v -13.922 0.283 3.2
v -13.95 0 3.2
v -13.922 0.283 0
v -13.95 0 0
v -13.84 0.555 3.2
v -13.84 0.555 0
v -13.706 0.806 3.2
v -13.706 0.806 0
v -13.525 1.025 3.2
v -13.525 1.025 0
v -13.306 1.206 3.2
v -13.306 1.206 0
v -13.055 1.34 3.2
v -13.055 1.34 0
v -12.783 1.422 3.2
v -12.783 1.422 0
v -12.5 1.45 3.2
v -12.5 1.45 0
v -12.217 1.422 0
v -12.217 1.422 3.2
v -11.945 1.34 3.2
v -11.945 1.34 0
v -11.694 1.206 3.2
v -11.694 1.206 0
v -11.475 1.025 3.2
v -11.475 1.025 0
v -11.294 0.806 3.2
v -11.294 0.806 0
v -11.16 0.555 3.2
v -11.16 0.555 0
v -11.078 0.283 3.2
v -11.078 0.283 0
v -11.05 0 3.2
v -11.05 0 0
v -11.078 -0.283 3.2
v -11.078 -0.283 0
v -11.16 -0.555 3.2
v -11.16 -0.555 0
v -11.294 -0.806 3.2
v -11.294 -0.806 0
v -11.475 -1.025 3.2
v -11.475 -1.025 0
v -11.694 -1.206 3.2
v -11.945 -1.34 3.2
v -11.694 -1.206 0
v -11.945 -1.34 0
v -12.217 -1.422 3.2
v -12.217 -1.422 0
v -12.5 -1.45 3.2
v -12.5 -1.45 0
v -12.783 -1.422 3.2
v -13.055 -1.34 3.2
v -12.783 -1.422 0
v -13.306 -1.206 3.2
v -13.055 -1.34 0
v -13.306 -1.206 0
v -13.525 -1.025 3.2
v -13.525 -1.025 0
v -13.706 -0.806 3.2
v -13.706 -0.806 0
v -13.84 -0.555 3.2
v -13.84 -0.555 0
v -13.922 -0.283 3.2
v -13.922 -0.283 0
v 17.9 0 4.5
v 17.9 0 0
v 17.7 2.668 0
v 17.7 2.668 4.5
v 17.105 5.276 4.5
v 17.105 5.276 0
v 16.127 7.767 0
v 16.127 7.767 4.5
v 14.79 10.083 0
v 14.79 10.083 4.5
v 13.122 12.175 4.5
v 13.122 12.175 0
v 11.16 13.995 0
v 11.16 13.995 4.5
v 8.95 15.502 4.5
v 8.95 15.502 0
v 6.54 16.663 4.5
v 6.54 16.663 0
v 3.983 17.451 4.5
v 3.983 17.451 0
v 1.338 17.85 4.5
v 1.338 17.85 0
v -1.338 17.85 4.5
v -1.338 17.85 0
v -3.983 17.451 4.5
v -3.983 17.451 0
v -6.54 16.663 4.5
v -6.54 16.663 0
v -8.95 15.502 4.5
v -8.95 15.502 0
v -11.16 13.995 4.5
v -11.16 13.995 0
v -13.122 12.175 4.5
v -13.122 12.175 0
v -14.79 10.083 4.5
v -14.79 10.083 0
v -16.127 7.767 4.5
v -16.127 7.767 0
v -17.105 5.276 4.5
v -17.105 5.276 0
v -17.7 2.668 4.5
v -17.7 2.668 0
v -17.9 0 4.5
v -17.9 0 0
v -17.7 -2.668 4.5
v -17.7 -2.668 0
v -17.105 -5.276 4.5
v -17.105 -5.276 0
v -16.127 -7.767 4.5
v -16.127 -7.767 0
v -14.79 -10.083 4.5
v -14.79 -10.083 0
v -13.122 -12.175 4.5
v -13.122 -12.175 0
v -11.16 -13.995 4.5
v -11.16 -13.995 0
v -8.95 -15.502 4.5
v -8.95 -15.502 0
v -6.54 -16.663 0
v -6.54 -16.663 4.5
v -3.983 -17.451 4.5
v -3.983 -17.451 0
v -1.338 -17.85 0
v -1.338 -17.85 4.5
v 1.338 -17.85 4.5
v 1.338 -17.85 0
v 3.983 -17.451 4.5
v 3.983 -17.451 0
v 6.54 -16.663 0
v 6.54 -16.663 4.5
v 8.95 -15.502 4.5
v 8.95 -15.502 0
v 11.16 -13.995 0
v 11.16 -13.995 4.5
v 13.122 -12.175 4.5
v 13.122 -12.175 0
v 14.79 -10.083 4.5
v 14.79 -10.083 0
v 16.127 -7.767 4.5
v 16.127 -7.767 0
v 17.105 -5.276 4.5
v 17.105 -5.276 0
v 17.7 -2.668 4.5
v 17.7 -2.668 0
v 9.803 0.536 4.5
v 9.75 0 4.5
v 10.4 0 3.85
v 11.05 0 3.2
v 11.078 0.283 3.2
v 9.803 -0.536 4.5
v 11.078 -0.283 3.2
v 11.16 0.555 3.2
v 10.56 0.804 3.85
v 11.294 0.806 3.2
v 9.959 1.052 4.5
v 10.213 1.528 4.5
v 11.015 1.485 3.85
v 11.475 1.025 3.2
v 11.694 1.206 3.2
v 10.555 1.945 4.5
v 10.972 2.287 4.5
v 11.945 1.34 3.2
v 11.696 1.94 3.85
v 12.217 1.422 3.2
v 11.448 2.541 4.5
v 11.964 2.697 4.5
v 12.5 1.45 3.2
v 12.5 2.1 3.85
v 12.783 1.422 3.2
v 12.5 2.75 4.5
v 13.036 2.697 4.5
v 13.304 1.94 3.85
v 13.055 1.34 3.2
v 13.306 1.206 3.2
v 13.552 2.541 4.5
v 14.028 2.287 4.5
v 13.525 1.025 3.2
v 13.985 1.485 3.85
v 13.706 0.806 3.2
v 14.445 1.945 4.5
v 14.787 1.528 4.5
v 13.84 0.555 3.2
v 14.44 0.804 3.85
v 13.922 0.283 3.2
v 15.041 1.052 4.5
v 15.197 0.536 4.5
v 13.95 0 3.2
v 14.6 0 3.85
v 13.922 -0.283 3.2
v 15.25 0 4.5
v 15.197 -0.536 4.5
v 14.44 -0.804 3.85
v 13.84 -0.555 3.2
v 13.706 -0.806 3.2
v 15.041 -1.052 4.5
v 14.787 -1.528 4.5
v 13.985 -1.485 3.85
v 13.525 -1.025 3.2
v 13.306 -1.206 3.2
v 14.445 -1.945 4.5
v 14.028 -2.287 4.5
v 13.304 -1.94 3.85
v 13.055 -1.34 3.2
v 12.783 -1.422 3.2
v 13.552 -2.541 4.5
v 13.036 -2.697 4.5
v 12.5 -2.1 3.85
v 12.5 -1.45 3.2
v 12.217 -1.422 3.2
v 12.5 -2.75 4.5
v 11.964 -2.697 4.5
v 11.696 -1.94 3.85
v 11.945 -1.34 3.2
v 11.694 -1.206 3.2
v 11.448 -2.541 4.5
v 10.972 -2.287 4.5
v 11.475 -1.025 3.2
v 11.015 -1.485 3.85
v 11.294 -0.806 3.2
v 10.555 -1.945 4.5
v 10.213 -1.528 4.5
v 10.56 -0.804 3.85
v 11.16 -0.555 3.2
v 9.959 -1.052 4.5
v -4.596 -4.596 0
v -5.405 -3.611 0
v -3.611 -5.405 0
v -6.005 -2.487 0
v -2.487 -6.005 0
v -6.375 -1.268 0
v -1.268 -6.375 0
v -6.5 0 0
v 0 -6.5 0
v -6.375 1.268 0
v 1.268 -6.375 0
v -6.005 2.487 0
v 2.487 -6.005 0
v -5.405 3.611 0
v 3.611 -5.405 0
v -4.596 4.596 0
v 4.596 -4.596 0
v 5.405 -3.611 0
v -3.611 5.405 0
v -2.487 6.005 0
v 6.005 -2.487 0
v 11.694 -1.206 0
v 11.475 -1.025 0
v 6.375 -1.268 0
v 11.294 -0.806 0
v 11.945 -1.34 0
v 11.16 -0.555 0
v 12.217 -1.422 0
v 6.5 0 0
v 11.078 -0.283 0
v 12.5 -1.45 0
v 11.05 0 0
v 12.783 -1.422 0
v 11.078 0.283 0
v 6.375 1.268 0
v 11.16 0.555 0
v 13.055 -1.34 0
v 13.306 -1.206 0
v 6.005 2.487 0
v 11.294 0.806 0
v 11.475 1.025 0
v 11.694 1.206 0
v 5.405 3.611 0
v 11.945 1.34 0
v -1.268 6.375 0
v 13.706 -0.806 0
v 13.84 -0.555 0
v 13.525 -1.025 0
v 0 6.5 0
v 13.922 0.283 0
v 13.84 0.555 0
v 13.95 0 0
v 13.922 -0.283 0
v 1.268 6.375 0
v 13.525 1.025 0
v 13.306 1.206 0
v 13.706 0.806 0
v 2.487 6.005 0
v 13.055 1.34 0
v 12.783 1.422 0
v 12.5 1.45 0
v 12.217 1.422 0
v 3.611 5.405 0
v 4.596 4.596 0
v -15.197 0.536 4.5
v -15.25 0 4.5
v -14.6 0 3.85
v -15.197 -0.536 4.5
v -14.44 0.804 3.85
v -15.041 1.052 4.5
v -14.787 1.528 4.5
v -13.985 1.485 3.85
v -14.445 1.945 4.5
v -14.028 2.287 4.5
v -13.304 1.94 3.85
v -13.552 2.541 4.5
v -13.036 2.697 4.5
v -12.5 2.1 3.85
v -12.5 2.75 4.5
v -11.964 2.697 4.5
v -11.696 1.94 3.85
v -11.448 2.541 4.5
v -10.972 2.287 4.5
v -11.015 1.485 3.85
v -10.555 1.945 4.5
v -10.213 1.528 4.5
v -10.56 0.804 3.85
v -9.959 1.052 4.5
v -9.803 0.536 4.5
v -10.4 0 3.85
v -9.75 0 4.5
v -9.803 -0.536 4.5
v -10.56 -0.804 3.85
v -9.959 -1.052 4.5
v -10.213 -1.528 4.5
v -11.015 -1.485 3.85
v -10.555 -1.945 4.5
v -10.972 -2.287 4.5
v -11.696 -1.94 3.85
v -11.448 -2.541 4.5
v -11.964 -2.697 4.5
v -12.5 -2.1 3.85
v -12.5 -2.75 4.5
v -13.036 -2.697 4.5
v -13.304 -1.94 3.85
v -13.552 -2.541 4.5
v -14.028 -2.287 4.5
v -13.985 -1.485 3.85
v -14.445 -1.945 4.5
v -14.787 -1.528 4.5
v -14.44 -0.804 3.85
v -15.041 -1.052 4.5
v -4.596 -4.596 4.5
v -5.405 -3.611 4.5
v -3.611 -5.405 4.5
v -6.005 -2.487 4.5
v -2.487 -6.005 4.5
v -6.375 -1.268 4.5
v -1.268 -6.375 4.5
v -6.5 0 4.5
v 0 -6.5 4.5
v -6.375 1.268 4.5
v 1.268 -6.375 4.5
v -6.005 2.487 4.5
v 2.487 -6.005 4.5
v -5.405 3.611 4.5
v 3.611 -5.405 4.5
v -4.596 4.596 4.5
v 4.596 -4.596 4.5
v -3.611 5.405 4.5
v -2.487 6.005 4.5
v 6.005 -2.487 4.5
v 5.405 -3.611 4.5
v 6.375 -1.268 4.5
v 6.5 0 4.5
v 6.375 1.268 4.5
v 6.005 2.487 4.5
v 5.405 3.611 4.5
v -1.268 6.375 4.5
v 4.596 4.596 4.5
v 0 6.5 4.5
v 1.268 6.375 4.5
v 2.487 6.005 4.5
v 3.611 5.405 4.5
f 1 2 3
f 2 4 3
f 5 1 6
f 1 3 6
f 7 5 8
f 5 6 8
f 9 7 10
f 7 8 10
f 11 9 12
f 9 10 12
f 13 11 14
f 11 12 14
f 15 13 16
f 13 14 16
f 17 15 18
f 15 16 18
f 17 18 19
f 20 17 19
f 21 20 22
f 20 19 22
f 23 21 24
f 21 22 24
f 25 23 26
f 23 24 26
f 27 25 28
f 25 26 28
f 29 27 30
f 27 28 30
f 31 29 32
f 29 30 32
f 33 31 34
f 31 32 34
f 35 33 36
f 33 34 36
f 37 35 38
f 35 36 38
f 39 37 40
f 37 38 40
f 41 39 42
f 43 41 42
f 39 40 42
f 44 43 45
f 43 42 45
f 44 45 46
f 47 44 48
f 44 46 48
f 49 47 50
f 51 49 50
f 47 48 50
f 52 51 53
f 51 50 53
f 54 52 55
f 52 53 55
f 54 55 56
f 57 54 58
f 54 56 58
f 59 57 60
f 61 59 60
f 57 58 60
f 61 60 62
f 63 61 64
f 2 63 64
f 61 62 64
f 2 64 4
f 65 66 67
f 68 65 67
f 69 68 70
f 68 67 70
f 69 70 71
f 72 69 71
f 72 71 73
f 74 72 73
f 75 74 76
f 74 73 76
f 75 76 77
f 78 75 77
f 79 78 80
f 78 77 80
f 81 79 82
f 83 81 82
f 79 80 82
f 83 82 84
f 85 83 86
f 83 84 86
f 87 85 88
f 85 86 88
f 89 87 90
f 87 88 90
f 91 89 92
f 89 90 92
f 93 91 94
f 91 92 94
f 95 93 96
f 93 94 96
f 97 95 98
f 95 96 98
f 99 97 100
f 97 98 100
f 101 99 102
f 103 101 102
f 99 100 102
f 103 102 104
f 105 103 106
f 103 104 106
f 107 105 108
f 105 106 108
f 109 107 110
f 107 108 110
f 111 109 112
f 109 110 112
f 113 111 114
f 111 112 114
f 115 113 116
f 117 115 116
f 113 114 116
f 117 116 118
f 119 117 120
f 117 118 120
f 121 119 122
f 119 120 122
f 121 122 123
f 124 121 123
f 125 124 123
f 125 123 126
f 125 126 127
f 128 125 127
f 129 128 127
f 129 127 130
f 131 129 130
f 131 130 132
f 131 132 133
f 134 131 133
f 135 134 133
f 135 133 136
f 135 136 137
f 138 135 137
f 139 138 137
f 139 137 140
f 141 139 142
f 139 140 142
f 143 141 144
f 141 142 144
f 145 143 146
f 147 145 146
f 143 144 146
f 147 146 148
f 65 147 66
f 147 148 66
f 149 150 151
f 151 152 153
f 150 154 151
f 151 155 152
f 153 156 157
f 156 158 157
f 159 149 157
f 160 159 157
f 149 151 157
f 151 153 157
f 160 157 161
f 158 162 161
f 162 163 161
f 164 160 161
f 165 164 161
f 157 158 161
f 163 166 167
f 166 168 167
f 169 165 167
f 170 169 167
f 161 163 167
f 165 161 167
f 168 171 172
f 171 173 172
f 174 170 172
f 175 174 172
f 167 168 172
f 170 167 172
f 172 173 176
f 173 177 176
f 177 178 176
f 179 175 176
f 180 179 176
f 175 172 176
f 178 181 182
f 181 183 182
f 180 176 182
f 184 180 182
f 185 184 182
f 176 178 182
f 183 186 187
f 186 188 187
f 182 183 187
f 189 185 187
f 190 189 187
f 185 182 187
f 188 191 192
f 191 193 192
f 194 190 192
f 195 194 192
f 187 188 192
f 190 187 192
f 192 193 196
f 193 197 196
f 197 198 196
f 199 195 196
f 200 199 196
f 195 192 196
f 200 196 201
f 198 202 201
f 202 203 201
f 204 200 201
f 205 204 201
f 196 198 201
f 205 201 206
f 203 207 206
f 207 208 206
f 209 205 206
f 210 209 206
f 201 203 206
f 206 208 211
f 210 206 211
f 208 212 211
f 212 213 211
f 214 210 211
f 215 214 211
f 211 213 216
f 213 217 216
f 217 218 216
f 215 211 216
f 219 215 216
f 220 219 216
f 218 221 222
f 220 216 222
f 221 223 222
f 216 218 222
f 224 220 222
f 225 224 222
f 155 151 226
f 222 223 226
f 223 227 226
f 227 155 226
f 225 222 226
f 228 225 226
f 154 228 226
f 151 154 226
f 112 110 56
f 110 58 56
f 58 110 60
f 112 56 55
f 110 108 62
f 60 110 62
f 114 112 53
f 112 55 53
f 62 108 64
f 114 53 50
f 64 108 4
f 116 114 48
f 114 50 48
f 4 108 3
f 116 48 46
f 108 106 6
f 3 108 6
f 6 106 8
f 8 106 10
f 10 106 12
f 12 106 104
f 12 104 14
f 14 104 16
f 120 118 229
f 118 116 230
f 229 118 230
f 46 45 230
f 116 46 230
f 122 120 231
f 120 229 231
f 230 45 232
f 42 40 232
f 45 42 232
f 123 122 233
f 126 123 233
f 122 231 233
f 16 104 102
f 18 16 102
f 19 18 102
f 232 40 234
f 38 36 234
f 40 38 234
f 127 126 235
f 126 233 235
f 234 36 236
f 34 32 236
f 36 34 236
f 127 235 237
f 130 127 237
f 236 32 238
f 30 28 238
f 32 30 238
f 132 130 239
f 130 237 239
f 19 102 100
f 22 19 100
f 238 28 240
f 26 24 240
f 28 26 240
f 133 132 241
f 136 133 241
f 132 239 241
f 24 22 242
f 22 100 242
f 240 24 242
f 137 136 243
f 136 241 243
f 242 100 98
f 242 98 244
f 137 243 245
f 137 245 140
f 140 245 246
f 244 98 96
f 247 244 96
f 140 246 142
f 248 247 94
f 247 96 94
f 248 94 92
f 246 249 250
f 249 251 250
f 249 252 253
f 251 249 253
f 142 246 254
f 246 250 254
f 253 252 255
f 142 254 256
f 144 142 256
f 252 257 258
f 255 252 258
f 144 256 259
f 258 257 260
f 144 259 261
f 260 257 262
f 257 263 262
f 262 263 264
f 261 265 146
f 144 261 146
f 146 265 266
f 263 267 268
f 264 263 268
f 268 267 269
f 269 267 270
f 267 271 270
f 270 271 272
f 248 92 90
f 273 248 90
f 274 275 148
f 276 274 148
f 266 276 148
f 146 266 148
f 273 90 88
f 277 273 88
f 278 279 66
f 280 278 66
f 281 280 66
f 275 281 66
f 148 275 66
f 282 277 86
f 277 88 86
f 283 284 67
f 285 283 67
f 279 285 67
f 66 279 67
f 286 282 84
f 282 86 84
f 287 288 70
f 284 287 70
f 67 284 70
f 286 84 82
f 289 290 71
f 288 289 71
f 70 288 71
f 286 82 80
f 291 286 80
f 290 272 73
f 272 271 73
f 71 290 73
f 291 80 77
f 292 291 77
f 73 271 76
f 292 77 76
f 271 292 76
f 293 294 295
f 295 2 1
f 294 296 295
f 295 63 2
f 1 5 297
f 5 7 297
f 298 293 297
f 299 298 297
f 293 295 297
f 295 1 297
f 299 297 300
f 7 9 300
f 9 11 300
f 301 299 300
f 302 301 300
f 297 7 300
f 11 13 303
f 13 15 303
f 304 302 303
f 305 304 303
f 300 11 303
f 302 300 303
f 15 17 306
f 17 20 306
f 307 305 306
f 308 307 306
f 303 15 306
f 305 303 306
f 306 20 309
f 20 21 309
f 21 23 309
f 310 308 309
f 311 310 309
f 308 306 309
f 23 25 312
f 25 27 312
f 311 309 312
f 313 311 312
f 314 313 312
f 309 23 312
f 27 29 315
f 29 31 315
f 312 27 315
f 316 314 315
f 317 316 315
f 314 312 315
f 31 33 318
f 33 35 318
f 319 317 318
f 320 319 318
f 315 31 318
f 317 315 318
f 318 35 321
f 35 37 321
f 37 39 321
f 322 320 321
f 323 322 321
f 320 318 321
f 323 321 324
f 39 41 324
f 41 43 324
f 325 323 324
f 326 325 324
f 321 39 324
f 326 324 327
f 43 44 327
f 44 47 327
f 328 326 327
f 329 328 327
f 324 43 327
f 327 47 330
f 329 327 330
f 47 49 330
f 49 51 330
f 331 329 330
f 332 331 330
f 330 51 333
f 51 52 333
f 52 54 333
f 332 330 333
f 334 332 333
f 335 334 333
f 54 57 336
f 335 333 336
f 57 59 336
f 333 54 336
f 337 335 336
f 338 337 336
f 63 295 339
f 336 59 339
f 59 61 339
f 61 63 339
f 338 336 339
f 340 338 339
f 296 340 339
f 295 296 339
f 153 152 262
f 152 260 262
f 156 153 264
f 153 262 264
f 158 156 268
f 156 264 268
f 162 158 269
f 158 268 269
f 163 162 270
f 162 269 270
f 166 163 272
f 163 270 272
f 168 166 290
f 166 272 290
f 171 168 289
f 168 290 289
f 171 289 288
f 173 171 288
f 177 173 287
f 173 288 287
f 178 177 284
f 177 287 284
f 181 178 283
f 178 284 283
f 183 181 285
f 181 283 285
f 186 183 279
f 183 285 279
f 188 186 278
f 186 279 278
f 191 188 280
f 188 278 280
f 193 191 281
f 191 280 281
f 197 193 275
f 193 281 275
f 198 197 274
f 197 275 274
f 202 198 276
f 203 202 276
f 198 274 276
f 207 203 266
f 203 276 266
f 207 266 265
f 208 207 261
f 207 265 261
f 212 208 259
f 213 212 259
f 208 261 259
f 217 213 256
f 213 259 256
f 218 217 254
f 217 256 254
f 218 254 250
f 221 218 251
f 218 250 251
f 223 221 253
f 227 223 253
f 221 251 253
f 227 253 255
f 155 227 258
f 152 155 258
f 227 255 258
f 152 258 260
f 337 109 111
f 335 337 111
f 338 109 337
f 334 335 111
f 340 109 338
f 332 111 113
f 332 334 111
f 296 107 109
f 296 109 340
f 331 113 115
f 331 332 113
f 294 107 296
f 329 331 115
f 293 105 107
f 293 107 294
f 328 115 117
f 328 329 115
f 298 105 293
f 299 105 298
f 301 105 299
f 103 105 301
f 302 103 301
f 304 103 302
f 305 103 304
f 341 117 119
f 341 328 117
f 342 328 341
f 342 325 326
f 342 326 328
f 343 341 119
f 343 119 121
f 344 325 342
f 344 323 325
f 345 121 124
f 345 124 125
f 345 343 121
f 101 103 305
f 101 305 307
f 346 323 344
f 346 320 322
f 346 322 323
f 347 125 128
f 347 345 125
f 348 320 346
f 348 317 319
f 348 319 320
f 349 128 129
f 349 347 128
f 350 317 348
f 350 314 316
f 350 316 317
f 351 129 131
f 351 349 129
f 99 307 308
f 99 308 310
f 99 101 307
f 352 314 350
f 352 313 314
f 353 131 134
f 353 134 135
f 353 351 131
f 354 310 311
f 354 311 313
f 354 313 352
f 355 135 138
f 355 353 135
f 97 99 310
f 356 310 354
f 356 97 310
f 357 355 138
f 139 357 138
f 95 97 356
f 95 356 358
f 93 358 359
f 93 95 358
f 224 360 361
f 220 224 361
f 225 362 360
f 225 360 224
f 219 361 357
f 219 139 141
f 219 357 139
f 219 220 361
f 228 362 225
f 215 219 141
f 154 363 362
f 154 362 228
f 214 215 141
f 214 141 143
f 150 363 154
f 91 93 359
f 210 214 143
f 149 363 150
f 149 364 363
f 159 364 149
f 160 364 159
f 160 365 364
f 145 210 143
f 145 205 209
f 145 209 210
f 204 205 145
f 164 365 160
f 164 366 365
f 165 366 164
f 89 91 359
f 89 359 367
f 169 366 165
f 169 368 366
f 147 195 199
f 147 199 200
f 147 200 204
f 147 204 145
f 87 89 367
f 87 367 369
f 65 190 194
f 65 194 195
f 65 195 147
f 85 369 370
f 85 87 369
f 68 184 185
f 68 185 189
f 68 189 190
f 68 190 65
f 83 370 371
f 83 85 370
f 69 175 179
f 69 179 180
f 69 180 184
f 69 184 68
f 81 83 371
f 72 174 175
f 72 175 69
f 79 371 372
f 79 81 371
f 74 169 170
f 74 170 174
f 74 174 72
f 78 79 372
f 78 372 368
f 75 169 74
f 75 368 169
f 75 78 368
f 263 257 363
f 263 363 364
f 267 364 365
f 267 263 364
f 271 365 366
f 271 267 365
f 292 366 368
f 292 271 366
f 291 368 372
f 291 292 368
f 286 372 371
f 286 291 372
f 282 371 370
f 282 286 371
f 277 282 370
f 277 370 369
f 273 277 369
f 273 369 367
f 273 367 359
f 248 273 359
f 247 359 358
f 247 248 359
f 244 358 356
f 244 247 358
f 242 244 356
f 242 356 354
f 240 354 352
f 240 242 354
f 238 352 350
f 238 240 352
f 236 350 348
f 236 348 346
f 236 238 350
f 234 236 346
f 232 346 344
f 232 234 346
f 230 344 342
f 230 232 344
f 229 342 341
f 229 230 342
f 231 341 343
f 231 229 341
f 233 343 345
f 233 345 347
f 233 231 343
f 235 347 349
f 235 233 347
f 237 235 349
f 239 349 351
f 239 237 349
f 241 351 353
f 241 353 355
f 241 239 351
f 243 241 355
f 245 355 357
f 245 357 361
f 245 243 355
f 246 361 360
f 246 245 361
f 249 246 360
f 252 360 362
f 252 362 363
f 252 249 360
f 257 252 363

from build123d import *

# Parameters (mm, degrees)
SKETCH1_R                                         = 17.9
SKETCH1_R_2                                       = 6.5
BOSS_EXTRUDE1_DEPTH                               = 4.5
CSK_FOR_M2_5_FLAT_HEAD_MACHINE_SCREW2_D           = 2.9
CSK_FOR_M2_5_FLAT_HEAD_MACHINE_SCREW2_DEPTH       = 4.5
CSK_FOR_M2_5_FLAT_HEAD_MACHINE_SCREW2_CSINK_D     = 5.5
CSK_FOR_M2_5_FLAT_HEAD_MACHINE_SCREW2_CSINK_ANGLE = 90
CSK_FOR_M2_5_FLAT_HEAD_MACHINE_SCREW2_TIP         = 0.871247898


with BuildPart() as part:
    # Sketch1 → Boss-Extrude1 (new body)
    with BuildSketch(Plane.XY):
        Circle(SKETCH1_R)
        Circle(SKETCH1_R_2, mode=Mode.SUBTRACT)
    extrude(amount=BOSS_EXTRUDE1_DEPTH)

    # CSK for M2.5 Flat Head Machine Screw2
    with Locations(Plane.XY.offset(4.5)):
        with Locations((-12.5, 0), (12.5, 0)):
            CounterSinkHole(CSK_FOR_M2_5_FLAT_HEAD_MACHINE_SCREW2_D / 2, CSK_FOR_M2_5_FLAT_HEAD_MACHINE_SCREW2_CSINK_D / 2, depth=CSK_FOR_M2_5_FLAT_HEAD_MACHINE_SCREW2_DEPTH, counter_sink_angle=CSK_FOR_M2_5_FLAT_HEAD_MACHINE_SCREW2_CSINK_ANGLE)
            with Locations((0, 0, -(CSK_FOR_M2_5_FLAT_HEAD_MACHINE_SCREW2_DEPTH + CSK_FOR_M2_5_FLAT_HEAD_MACHINE_SCREW2_TIP / 2))):  # 118° drill point
                Cone(0, CSK_FOR_M2_5_FLAT_HEAD_MACHINE_SCREW2_D / 2, CSK_FOR_M2_5_FLAT_HEAD_MACHINE_SCREW2_TIP, mode=Mode.SUBTRACT)


solid = part.part
